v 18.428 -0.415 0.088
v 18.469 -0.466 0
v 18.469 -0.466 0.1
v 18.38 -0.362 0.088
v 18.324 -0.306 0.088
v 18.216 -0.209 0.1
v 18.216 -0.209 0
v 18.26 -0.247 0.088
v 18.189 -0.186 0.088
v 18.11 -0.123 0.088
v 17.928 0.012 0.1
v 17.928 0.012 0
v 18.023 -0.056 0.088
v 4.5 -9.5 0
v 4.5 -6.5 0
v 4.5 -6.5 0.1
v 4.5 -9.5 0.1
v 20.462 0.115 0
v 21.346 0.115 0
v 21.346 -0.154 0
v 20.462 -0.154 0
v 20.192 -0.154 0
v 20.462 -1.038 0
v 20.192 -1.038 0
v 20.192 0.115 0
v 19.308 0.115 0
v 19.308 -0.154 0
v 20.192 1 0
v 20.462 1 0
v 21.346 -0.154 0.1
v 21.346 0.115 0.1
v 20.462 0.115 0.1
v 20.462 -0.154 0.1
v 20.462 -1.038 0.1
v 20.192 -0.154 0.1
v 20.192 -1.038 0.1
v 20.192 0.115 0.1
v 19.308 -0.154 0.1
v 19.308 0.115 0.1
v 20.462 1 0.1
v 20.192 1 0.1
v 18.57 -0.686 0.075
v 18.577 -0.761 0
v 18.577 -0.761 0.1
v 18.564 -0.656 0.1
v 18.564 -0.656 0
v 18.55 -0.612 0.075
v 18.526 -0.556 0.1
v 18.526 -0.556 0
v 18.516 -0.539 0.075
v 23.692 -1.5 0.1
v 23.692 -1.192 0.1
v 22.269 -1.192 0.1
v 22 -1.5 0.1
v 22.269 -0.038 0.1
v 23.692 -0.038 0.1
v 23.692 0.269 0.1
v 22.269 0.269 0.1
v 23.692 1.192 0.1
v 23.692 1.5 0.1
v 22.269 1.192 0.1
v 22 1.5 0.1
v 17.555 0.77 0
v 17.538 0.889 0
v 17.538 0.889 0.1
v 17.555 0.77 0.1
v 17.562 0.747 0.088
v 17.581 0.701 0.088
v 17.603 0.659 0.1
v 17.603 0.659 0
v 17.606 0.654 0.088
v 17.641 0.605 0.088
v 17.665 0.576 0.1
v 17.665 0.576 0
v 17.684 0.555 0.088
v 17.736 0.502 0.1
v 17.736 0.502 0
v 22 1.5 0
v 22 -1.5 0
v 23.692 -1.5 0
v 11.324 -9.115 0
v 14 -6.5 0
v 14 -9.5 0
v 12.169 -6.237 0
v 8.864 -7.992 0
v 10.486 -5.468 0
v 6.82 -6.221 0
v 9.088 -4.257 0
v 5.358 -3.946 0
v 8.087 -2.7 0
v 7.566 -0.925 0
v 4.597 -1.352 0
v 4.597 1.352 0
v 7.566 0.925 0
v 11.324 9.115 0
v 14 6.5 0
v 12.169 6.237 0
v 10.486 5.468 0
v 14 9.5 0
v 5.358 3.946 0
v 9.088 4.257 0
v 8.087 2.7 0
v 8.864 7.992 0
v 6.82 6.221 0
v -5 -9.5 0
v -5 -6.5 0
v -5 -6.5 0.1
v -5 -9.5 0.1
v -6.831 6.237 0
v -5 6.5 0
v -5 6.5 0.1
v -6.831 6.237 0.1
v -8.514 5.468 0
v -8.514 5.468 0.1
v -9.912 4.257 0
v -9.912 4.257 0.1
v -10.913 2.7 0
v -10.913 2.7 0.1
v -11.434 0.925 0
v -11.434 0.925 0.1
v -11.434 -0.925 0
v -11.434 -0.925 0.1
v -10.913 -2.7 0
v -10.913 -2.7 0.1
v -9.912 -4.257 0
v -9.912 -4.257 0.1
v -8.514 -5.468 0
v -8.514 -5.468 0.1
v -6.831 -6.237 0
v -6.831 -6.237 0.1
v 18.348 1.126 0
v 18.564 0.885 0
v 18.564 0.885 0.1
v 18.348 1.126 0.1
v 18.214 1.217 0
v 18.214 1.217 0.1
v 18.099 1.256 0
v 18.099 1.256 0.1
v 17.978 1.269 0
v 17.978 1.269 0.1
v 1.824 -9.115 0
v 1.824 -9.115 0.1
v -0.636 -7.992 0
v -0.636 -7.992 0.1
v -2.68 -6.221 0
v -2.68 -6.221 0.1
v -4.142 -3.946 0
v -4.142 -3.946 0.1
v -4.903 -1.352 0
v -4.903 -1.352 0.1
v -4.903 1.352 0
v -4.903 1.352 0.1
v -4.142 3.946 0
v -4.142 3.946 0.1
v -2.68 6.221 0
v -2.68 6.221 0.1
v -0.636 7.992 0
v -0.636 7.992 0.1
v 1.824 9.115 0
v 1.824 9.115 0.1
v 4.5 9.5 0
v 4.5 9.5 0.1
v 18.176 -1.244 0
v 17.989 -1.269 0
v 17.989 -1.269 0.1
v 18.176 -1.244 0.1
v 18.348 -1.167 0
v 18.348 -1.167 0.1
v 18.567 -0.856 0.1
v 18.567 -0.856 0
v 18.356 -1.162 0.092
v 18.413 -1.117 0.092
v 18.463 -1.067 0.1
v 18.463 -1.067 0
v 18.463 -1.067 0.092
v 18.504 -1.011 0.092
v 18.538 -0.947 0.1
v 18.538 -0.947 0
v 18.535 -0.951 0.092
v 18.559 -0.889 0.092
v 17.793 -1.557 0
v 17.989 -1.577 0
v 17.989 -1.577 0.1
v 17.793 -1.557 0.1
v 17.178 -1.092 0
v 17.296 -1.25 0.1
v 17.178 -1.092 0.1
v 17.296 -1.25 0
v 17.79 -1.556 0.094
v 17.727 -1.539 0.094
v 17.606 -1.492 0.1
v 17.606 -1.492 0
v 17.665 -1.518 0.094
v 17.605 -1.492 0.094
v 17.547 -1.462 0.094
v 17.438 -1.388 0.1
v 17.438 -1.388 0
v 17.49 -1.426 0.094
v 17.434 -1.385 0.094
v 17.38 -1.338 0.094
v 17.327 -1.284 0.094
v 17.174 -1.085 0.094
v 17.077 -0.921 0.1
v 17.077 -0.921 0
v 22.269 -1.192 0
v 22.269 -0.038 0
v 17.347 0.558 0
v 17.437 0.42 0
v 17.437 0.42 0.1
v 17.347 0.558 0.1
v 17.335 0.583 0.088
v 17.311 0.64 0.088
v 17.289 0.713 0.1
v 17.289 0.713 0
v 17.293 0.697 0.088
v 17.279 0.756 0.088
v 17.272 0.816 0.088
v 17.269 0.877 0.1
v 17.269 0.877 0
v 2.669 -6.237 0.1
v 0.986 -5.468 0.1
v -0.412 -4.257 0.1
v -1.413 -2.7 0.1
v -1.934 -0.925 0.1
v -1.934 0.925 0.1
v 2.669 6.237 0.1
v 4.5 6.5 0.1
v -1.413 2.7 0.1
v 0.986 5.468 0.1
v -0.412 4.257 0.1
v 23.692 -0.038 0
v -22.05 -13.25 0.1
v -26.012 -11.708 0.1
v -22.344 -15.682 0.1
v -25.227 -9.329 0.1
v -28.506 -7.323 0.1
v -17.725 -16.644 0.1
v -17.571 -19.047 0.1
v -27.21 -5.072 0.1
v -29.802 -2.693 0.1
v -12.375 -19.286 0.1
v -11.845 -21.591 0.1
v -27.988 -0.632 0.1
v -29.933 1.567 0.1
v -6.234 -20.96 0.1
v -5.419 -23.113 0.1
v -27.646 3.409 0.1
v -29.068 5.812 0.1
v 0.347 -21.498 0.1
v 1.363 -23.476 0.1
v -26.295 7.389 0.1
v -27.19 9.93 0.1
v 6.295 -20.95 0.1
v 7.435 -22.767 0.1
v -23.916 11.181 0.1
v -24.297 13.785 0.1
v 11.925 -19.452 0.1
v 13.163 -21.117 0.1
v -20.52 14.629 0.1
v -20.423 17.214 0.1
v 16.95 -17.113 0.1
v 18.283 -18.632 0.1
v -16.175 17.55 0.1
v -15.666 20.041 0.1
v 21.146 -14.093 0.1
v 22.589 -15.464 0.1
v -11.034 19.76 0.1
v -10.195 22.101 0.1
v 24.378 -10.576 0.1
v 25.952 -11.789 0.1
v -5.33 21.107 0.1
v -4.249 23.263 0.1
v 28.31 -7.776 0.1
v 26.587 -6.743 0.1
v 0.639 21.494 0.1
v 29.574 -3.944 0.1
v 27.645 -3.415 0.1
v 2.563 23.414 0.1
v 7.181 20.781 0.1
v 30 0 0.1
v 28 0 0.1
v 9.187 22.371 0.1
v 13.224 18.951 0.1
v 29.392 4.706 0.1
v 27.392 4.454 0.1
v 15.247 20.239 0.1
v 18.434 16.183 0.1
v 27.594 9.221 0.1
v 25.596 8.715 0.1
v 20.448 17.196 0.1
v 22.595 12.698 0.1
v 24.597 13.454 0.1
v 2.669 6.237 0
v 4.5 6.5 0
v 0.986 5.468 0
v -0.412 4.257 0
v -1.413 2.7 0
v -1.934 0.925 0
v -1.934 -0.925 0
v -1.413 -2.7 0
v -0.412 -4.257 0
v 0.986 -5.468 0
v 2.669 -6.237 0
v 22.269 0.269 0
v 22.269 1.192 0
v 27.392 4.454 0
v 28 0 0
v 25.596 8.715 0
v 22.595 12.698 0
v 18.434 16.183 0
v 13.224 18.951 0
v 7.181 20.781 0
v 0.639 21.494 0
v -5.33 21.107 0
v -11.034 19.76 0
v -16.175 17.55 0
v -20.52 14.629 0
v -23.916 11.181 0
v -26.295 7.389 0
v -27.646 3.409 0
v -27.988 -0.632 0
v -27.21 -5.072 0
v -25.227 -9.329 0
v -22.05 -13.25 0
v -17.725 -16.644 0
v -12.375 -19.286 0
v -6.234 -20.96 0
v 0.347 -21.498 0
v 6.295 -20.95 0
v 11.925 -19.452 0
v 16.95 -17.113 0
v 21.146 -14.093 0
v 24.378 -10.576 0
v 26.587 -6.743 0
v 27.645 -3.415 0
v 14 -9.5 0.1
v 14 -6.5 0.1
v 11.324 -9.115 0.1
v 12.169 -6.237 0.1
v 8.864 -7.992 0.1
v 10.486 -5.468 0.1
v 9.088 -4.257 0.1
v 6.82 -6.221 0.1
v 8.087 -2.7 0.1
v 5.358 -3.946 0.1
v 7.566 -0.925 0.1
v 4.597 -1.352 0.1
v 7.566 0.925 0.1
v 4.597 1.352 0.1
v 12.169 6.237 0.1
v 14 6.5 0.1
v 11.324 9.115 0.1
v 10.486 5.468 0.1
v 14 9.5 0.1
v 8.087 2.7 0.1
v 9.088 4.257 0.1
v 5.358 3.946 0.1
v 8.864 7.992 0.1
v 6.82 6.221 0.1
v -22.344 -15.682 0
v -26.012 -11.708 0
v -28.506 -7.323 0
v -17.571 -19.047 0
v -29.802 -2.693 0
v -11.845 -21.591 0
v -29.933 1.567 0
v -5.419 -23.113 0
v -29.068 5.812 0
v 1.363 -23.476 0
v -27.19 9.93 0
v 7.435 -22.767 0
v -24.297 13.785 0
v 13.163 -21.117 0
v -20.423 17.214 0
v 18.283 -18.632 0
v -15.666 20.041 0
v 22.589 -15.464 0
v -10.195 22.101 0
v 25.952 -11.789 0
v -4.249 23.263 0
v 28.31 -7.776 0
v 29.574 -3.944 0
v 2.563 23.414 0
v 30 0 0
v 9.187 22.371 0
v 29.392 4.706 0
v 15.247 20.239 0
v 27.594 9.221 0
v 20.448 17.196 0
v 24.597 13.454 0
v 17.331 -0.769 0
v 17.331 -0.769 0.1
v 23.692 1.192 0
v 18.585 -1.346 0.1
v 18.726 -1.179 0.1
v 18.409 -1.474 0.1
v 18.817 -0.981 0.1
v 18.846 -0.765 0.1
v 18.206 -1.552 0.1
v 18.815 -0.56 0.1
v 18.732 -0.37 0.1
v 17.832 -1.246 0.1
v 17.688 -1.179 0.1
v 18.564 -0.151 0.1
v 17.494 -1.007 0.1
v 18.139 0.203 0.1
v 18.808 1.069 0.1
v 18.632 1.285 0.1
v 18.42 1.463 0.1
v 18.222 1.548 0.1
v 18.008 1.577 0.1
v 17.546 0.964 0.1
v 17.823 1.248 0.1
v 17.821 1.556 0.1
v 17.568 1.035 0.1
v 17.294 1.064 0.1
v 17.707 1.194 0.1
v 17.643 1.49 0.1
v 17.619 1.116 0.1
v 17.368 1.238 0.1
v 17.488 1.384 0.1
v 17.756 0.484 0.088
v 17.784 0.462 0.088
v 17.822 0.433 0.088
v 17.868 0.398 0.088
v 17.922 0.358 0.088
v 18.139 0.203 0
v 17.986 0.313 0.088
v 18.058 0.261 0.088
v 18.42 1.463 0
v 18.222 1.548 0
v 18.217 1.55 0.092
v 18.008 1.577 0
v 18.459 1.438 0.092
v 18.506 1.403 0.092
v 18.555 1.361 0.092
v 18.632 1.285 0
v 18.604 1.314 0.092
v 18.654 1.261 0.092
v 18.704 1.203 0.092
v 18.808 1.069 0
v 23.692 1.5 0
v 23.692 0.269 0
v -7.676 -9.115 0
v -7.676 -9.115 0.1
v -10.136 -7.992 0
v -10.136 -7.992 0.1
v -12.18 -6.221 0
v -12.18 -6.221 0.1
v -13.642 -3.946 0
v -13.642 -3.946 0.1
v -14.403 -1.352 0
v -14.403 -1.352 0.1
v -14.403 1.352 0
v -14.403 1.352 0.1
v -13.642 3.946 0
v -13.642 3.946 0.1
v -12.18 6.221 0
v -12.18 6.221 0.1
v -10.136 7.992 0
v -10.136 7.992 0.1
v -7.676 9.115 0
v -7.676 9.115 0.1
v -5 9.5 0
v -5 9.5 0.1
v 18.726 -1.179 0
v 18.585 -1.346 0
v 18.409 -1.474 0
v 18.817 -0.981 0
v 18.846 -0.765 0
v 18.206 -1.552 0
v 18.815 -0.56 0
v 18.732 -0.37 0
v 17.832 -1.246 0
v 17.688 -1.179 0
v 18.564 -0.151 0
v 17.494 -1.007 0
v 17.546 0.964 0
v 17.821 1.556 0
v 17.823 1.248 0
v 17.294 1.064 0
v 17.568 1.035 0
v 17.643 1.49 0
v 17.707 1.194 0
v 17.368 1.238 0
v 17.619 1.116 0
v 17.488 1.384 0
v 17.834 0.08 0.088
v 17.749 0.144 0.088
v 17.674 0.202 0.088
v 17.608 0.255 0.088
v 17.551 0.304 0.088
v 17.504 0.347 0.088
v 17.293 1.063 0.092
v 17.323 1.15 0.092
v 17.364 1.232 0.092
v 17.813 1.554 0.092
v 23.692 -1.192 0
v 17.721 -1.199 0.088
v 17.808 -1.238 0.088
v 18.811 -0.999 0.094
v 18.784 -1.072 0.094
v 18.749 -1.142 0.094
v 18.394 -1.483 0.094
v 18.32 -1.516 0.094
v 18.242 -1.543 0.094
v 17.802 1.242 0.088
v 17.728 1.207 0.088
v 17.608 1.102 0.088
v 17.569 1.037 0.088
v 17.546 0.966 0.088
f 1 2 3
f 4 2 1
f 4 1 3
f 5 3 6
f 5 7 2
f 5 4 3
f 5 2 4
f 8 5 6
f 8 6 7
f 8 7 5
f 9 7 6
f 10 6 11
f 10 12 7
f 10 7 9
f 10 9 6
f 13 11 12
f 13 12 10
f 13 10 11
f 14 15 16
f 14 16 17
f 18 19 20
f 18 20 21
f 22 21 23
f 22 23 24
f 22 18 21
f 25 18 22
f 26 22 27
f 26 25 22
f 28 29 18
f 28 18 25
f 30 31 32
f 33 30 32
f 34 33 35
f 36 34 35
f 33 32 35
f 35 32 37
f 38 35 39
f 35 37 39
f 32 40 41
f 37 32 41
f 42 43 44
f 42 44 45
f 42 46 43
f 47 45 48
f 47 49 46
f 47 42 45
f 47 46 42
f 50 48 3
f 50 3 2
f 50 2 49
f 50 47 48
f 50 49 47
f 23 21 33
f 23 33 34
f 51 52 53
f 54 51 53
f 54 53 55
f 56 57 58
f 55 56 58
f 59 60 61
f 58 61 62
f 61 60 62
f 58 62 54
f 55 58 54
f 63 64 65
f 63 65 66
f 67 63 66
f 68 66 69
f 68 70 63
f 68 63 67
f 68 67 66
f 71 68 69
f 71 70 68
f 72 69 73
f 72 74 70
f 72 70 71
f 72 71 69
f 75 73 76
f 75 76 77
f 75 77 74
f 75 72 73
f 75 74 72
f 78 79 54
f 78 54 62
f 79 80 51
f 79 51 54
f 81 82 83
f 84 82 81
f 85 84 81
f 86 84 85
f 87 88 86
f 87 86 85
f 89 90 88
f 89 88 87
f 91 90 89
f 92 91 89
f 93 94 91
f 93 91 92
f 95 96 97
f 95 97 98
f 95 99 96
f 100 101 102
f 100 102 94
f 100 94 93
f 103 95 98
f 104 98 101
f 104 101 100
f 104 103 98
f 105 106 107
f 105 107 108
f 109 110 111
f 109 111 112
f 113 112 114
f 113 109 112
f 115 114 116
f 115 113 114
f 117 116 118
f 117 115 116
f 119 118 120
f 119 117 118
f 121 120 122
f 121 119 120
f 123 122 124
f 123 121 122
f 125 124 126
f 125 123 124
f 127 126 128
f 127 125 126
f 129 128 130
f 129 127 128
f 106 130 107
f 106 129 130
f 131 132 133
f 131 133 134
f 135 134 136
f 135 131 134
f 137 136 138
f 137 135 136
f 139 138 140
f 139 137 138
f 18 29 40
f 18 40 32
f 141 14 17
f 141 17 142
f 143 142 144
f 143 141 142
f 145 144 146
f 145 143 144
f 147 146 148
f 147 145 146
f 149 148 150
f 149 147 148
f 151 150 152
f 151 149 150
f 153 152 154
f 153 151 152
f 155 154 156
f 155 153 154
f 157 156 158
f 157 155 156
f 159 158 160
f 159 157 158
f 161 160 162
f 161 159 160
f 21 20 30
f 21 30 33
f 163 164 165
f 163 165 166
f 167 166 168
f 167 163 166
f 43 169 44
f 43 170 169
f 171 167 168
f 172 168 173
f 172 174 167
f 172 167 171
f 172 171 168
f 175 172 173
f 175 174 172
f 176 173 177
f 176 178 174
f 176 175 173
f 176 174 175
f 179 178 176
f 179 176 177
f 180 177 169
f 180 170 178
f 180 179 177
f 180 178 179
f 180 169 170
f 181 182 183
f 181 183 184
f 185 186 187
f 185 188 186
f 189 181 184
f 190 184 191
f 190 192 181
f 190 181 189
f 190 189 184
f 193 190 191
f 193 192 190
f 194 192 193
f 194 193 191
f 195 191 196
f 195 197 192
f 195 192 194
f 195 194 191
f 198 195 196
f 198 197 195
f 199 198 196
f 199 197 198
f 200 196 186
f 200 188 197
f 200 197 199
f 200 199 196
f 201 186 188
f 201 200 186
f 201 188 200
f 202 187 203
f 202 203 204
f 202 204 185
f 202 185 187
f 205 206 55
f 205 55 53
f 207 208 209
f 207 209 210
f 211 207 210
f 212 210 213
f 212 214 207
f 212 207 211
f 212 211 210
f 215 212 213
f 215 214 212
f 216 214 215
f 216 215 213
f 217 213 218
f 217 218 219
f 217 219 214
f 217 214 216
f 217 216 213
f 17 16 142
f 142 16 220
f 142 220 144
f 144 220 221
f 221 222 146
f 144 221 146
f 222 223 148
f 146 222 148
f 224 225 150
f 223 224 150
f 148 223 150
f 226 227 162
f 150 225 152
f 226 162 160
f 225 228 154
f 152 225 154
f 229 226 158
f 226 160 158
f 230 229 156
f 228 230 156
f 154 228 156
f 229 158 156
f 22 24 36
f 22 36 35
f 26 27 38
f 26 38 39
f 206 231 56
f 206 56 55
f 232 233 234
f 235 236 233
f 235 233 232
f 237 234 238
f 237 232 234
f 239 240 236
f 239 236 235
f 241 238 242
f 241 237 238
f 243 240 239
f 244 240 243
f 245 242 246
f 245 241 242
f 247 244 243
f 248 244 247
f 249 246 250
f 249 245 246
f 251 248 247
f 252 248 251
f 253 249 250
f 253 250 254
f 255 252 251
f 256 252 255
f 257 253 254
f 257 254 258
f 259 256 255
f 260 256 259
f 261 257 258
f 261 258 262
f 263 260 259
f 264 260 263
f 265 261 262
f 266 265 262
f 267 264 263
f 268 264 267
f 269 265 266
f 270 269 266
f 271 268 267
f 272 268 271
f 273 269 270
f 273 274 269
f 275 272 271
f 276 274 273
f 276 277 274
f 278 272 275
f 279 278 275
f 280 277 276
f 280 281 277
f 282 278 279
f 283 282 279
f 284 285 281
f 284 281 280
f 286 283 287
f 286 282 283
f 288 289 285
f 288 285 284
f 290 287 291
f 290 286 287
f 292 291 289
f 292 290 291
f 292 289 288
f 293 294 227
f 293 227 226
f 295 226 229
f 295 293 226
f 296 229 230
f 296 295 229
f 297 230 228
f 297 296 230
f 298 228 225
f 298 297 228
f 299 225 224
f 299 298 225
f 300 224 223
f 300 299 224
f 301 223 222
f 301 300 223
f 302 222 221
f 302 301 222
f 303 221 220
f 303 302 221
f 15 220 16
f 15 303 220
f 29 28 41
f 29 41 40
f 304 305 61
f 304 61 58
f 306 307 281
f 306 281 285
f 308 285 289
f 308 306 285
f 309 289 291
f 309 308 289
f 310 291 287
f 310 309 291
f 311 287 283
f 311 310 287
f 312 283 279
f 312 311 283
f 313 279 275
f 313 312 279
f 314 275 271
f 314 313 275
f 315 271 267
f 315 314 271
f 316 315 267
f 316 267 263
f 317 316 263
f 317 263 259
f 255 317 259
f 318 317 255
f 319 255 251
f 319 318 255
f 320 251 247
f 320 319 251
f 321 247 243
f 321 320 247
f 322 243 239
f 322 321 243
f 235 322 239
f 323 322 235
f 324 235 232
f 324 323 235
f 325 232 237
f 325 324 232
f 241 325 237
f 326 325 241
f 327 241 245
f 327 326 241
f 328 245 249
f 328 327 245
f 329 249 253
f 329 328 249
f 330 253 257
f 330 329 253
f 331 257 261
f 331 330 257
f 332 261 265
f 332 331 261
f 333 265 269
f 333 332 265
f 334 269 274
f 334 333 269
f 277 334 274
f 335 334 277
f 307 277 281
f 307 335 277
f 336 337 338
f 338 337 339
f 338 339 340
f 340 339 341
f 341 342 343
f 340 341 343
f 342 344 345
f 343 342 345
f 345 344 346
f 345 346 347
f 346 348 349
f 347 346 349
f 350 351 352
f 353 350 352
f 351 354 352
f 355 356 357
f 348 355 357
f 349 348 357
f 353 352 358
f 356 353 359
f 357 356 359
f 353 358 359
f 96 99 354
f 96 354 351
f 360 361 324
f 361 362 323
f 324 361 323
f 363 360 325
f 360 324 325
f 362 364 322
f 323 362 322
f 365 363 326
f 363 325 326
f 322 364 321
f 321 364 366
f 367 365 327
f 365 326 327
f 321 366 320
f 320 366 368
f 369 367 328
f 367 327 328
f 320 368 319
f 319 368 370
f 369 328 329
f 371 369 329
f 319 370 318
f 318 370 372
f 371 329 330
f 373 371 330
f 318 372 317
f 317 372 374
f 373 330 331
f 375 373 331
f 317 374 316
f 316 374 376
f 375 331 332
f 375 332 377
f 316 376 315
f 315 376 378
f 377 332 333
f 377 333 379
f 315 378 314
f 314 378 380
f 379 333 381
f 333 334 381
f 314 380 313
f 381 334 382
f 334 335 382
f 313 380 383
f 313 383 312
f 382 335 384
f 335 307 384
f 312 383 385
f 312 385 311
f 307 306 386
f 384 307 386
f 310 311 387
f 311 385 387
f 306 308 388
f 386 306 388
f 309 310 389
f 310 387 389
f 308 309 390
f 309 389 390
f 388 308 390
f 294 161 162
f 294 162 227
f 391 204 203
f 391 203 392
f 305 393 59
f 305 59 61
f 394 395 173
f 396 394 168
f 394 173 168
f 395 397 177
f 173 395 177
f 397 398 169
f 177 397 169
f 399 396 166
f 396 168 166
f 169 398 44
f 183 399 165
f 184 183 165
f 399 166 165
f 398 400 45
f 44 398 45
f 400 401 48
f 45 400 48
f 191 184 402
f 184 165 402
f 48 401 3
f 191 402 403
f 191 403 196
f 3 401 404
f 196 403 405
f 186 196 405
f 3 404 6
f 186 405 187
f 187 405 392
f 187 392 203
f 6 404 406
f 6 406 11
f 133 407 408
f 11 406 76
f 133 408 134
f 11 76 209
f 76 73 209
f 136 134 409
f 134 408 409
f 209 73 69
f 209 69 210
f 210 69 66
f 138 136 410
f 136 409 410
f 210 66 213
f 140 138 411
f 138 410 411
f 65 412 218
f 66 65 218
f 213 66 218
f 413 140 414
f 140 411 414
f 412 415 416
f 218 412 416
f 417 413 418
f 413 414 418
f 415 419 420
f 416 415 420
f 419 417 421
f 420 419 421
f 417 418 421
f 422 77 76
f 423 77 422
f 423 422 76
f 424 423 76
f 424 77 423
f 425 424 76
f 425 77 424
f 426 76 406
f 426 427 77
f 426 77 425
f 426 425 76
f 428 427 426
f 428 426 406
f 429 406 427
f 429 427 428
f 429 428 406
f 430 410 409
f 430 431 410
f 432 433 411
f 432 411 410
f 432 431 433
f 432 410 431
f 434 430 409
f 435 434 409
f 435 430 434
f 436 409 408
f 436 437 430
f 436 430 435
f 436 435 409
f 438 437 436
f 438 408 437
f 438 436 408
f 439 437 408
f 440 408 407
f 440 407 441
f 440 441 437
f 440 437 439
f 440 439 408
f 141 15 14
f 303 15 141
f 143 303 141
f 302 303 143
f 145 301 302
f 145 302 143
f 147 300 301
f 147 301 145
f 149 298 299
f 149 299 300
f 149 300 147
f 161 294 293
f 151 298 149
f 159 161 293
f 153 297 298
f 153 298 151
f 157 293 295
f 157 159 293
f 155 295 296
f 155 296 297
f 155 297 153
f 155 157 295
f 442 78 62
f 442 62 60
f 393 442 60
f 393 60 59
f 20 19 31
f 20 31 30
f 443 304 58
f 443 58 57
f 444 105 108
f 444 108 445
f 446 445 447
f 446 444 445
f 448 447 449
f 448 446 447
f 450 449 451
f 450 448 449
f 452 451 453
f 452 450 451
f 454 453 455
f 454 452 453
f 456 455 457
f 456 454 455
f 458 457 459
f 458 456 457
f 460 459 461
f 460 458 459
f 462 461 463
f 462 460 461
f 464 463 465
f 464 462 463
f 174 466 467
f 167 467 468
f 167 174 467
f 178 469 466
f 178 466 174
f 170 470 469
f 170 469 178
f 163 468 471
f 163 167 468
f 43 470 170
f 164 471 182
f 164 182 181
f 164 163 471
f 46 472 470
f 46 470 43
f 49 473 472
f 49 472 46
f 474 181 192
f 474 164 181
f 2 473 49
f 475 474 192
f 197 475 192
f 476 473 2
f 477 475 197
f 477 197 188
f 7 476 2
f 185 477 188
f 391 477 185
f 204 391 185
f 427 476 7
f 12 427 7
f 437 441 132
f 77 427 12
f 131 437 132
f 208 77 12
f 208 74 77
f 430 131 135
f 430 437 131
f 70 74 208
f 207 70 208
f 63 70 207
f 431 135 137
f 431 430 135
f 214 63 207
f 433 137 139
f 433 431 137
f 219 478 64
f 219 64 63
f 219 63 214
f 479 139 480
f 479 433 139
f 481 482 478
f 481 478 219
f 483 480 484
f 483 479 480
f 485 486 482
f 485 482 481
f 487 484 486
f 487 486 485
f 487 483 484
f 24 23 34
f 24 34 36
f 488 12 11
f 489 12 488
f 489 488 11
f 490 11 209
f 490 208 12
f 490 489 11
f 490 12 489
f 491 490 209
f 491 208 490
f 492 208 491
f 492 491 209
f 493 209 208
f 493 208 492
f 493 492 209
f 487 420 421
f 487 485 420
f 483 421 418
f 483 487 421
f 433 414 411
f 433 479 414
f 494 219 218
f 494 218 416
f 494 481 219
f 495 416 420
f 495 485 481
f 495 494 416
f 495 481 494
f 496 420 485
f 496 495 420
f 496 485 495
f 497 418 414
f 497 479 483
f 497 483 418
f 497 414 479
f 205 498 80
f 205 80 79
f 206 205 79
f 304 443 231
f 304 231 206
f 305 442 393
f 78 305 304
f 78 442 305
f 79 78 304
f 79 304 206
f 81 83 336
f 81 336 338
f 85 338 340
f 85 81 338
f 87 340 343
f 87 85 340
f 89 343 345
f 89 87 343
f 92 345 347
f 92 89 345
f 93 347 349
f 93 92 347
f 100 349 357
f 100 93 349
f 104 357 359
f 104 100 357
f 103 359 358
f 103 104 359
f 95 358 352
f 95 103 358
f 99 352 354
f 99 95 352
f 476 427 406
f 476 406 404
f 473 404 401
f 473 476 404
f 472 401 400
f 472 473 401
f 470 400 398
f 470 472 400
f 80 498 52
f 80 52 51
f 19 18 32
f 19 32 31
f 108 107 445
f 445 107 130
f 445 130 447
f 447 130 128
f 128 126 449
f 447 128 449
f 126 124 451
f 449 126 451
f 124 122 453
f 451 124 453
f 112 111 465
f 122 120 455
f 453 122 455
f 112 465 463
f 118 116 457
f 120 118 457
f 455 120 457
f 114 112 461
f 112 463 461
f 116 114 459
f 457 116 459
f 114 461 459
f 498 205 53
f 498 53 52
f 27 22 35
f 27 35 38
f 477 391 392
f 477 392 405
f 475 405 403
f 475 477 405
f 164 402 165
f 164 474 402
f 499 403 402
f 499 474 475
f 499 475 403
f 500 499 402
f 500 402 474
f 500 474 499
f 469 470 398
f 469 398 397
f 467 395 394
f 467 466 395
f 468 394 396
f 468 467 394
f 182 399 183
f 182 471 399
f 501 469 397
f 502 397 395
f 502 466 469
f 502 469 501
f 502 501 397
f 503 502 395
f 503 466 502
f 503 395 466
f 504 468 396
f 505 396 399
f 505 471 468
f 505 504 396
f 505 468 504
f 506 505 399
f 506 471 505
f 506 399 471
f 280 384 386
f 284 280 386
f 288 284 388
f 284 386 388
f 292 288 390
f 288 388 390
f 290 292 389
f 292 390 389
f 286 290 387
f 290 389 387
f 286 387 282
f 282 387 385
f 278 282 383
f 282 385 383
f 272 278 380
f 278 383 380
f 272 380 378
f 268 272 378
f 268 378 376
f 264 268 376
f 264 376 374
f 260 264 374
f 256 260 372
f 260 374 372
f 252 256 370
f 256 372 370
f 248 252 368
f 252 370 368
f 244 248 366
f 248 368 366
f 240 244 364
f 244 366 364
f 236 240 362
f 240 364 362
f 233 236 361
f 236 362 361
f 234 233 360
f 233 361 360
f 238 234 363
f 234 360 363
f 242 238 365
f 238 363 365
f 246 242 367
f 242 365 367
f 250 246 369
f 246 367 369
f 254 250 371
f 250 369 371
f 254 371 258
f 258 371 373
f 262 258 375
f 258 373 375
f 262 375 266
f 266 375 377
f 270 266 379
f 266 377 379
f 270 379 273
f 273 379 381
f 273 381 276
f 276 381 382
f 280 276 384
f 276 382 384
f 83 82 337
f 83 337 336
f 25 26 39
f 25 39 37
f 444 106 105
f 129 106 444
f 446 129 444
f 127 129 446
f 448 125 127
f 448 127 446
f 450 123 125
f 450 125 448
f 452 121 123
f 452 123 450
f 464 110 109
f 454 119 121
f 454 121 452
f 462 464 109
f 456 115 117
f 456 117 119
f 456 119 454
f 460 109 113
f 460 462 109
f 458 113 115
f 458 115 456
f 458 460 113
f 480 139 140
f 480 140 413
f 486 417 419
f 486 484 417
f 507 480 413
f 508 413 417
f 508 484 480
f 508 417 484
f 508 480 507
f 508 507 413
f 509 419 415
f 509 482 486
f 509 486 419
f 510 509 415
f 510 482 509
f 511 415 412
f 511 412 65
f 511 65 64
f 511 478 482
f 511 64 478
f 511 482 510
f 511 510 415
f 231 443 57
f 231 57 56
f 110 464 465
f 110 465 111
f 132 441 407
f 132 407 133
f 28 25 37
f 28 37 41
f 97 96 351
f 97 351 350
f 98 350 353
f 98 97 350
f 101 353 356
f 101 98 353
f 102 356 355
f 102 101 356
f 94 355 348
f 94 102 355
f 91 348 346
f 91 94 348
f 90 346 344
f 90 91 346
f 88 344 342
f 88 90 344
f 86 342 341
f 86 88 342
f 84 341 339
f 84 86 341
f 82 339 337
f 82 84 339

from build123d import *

# Parameters (mm, degrees)
SKIZZE1_RX                        = 30
SKIZZE1_RY                        = 23.5
SKIZZE1_RX_2                      = 28
SKIZZE1_RY_2                      = 21.5
AUFSATZ_LINEAR_AUSTRAGEN1_DEPTH   = 0.1
AUFSATZ_LINEAR_AUSTRAGEN1_2_DEPTH = 0.1
AUFSATZ_LINEAR_AUSTRAGEN1_3_DEPTH = 0.1
AUFSATZ_LINEAR_AUSTRAGEN1_4_DEPTH = 0.1
AUFSATZ_LINEAR_AUSTRAGEN2_DEPTH   = 0.1
AUFSATZ_LINEAR_AUSTRAGEN2_2_DEPTH = 0.1
AUFSATZ_LINEAR_AUSTRAGEN2_3_DEPTH = 0.1


with BuildPart() as part:
    # Skizze1 → Aufsatz-Linear austragen1 (new body)
    with BuildSketch(Plane.XY):
        with Locations((0, 0)):
            Ellipse(SKIZZE1_RX, SKIZZE1_RY)
        with Locations((0, 0)):
            Ellipse(SKIZZE1_RX_2, SKIZZE1_RY_2, mode=Mode.SUBTRACT)
    extrude(amount=AUFSATZ_LINEAR_AUSTRAGEN1_DEPTH)


with BuildPart() as body_2:
    # Skizze1 → Aufsatz-Linear austragen1 2 (new body)
    with BuildSketch(Plane.XY):
        with BuildLine():
            ThreePointArc((-5, 6.5), (-11.5, 0), (-5, -6.5))
            Line((-5, -6.5), (-5, -9.5))
            ThreePointArc((-5, -9.5), (-14.5, 0), (-5, 9.5))
            Line((-5, 9.5), (-5, 6.5))
        make_face()
    extrude(amount=AUFSATZ_LINEAR_AUSTRAGEN1_2_DEPTH)


with BuildPart() as body_3:
    # Skizze1 → Aufsatz-Linear austragen1 3 (new body)
    with BuildSketch(Plane.XY):
        with BuildLine():
            ThreePointArc((4.5, 6.5), (-2, 0), (4.5, -6.5))
            Line((4.5, -6.5), (4.5, -9.5))
            ThreePointArc((4.5, -9.5), (-5, 0), (4.5, 9.5))
            Line((4.5, 9.5), (4.5, 6.5))
        make_face()
    extrude(amount=AUFSATZ_LINEAR_AUSTRAGEN1_3_DEPTH)


with BuildPart() as body_4:
    # Skizze1 → Aufsatz-Linear austragen1 4 (new body)
    with BuildSketch(Plane.XY):
        with BuildLine():
            ThreePointArc((14, 6.5), (7.5, 0), (14, -6.5))
            Line((14, -6.5), (14, -9.5))
            ThreePointArc((14, -9.5), (4.5, 0), (14, 9.5))
            Line((14, 9.5), (14, 6.5))
        make_face()
    extrude(amount=AUFSATZ_LINEAR_AUSTRAGEN1_4_DEPTH)


with BuildPart() as body_5:
    # Skizze4 → Aufsatz-Linear austragen2 (new body)
    with BuildSketch(Plane.XY):
        with BuildLine():
            Line((17.076923077, -0.921274038), (17.330528846, -0.769230769))
            add(Edge.make_bspline(
                [(17.330528846, -0.769230769), (17.354115907, -0.808714528), (17.399307804, -0.884363885), (17.474694684, -0.986585063), (17.552808607, -1.073466912), (17.634228036, -1.144504004), (17.718455992, -1.200431621), (17.806042324, -1.240033534), (17.896691876, -1.264732941), (17.958383723, -1.267733015), (17.989182692, -1.269230769)],
                knots=[0, 0, 0, 0, 1.272034388, 2.437168799, 3.508375237, 4.49857839, 5.41946034, 6.295179144, 7.148887113, 8, 8, 8, 8], degree=3))
            add(Edge.make_bspline(
                [(17.989182692, -1.269230769), (18.015485716, -1.268498193), (18.067631521, -1.267045858), (18.144399158, -1.253090885), (18.218954988, -1.231651917), (18.289762392, -1.200948262), (18.355844347, -1.163800988), (18.413792943, -1.118932836), (18.463889612, -1.068698946), (18.504868853, -1.01265667), (18.536308883, -0.952384829), (18.560473513, -0.890519727), (18.573883576, -0.826089526), (18.575903651, -0.782709129), (18.576923077, -0.760817308)],
                knots=[0, 0, 0, 0, 1.095163259, 2.171163733, 3.241058638, 4.321873601, 5.38011039, 6.391990106, 7.366004449, 8.327778327, 9.272591725, 10.192022065, 11.087607919, 12, 12, 12, 12], degree=3))
            add(Edge.make_bspline(
                [(18.576923077, -0.760817308), (18.575659382, -0.735839437), (18.573090475, -0.685063074), (18.551377778, -0.610149086), (18.51722128, -0.536012598), (18.485710443, -0.49015437), (18.469350962, -0.466346154)],
                knots=[0, 0, 0, 0, 0.938893495, 1.908633276, 2.914225137, 4, 4, 4, 4], degree=3))
            add(Edge.make_bspline(
                [(18.469350962, -0.466346154), (18.455919007, -0.449163162), (18.427720297, -0.413089621), (18.379242429, -0.359393704), (18.322357188, -0.304006488), (18.259011284, -0.244813011), (18.186897208, -0.184566328), (18.108273624, -0.120393518), (18.021133174, -0.054735024), (17.960019319, -0.010701396), (17.928485577, 0.012019231)],
                knots=[0, 0, 0, 0, 0.722233717, 1.516239348, 2.393582979, 3.351407094, 4.387010283, 5.505090956, 6.712668013, 8, 8, 8, 8], degree=3))
            add(Edge.make_bspline(
                [(17.928485577, 0.012019231), (17.896922152, 0.034500877), (17.836575286, 0.077484074), (17.752182215, 0.141276317), (17.676715533, 0.199599634), (17.610510662, 0.253003073), (17.553596721, 0.301493877), (17.505525226, 0.344606396), (17.467520749, 0.383506591), (17.446387394, 0.408742027), (17.436899038, 0.420072115)],
                knots=[0, 0, 0, 0, 1.452282411, 2.77665338, 3.964542531, 5.026858415, 5.96415736, 6.766646006, 7.446254459, 8, 8, 8, 8], degree=3))
            add(Edge.make_bspline(
                [(17.436899038, 0.420072115), (17.423636857, 0.437730147), (17.397554997, 0.472457036), (17.363126992, 0.526735485), (17.333864853, 0.582298284), (17.310925711, 0.63929474), (17.291608952, 0.696924679), (17.27861644, 0.755940032), (17.270480957, 0.816075991), (17.269647825, 0.856544706), (17.269230769, 0.876802885)],
                knots=[0, 0, 0, 0, 1.068054152, 2.10047183, 3.106115577, 4.101338837, 5.06977816, 6.043150881, 7.020423561, 8, 8, 8, 8], degree=3))
            add(Edge.make_bspline(
                [(17.269230769, 0.876802885), (17.27034952, 0.908542691), (17.272563108, 0.971343889), (17.291283552, 1.063084601), (17.320831746, 1.150672958), (17.362227365, 1.233241816), (17.41559081, 1.308641228), (17.477344502, 1.377738503), (17.550897205, 1.435825859), (17.631599453, 1.486579052), (17.719933486, 1.52630413), (17.812497118, 1.556270685), (17.909437465, 1.573250049), (17.975097295, 1.575686704), (18.008413462, 1.576923077)],
                knots=[0, 0, 0, 0, 1.005424448, 1.989358655, 2.955360095, 3.929531133, 4.905563448, 5.876582895, 6.856512386, 7.866279853, 8.892233794, 9.918561126, 10.94386622, 12, 12, 12, 12], degree=3))
            add(Edge.make_bspline(
                [(18.008413462, 1.576923077), (18.043765548, 1.575703747), (18.114069563, 1.573278889), (18.217483177, 1.552195291), (18.317049505, 1.517309001), (18.397143732, 1.477718722), (18.459828956, 1.438177509), (18.507634156, 1.402160517), (18.556077685, 1.360696138), (18.605550303, 1.313673927), (18.655213726, 1.260662426), (18.705805256, 1.202024693), (18.757443201, 1.138119073), (18.790662509, 1.092498073), (18.807692308, 1.069110577)],
                knots=[0, 0, 0, 0, 1.286793592, 2.559021753, 3.825965368, 5.121522368, 5.803751409, 6.523245864, 7.299691795, 8.125521123, 9.008227632, 9.944561021, 10.946284179, 12, 12, 12, 12], degree=3))
            Line((18.807692308, 1.069110577), (18.564302885, 0.884615385))
            add(Edge.make_bspline(
                [(18.564302885, 0.884615385), (18.549606371, 0.903548548), (18.521304322, 0.940009393), (18.478336191, 0.991070521), (18.437837349, 1.037713218), (18.397937007, 1.078226185), (18.360742466, 1.114828013), (18.324642144, 1.146164948), (18.290155557, 1.17254403), (18.246683919, 1.200695652), (18.192068732, 1.228601227), (18.123510558, 1.252214722), (18.051865179, 1.266404775), (18.003068353, 1.268280965), (17.978365385, 1.269230769)],
                knots=[0, 0, 0, 0, 1.181633172, 2.275549214, 3.290209073, 4.226197932, 5.078386478, 5.862611352, 6.581680152, 7.217281963, 8.414376989, 9.595101626, 10.782541182, 12, 12, 12, 12], degree=3))
            add(Edge.make_bspline(
                [(17.978365385, 1.269230769), (17.94737408, 1.268192169), (17.887610268, 1.266189327), (17.802761494, 1.244315054), (17.726395272, 1.209873459), (17.660778788, 1.161603478), (17.606147093, 1.104414056), (17.566628129, 1.038603609), (17.542842273, 0.965932978), (17.539939748, 0.91524013), (17.538461538, 0.889423077)],
                knots=[0, 0, 0, 0, 1.14458467, 2.207223713, 3.21896685, 4.227309161, 5.202851033, 6.127160689, 7.046193047, 8, 8, 8, 8], degree=3))
            add(Edge.make_bspline(
                [(17.538461538, 0.889423077), (17.538798504, 0.873350381), (17.539472987, 0.841178707), (17.548879956, 0.793648917), (17.560965095, 0.746239197), (17.580115922, 0.699162698), (17.606554754, 0.651596104), (17.641273476, 0.602720329), (17.684999172, 0.552104579), (17.718493754, 0.519183973), (17.736177885, 0.501802885)],
                knots=[0, 0, 0, 0, 0.858281714, 1.717966888, 2.583508476, 3.4729293, 4.427298488, 5.488583878, 6.674047936, 8, 8, 8, 8], degree=3))
            add(Edge.make_bspline(
                [(17.736177885, 0.501802885), (17.742744775, 0.495942577), (17.758346204, 0.482019827), (17.786868426, 0.459226443), (17.824533682, 0.431109781), (17.870358426, 0.396320653), (17.925187593, 0.355965114), (17.989027213, 0.310559161), (18.061165669, 0.258628767), (18.112355883, 0.222322304), (18.139423077, 0.203125)],
                knots=[0, 0, 0, 0, 0.420754252, 0.999615792, 1.744751191, 2.668019286, 3.750313428, 4.999500688, 6.413464383, 8, 8, 8, 8], degree=3))
            add(Edge.make_bspline(
                [(18.139423077, 0.203125), (18.171982431, 0.179432406), (18.235029108, 0.133554982), (18.324735605, 0.064627256), (18.406073155, -0.002785117), (18.479327329, -0.068251637), (18.545221822, -0.131275717), (18.603025583, -0.192615586), (18.653327595, -0.251831791), (18.707481211, -0.327751142), (18.762816484, -0.420992071), (18.810337776, -0.535230561), (18.840302074, -0.649913122), (18.844220516, -0.726993267), (18.846153846, -0.765024038)],
                knots=[0, 0, 0, 0, 1.163667725, 2.253281268, 3.268753668, 4.215851969, 5.092017293, 5.902905408, 6.650798638, 7.335211899, 8.59617414, 9.77448103, 10.901945474, 12, 12, 12, 12], degree=3))
            add(Edge.make_bspline(
                [(18.846153846, -0.765024038), (18.845590585, -0.79191978), (18.844475001, -0.845188966), (18.83165136, -0.923407603), (18.812863076, -0.99937692), (18.784545447, -1.072157874), (18.74998274, -1.143081956), (18.706125956, -1.210288728), (18.655290797, -1.275265641), (18.596976142, -1.336280062), (18.533165368, -1.392291087), (18.465722201, -1.442115997), (18.394536253, -1.483660274), (18.319993696, -1.517560996), (18.242077407, -1.544075439), (18.160813593, -1.56328647), (18.076068297, -1.575077079), (18.018467885, -1.576300875), (17.989182692, -1.576923077)],
                knots=[0, 0, 0, 0, 0.983748083, 1.948392443, 2.894712957, 3.844097841, 4.80183111, 5.778335162, 6.776009319, 7.81870978, 8.863265674, 9.881300176, 10.883814829, 11.87499822, 12.874611388, 13.892143829, 14.928324115, 16, 16, 16, 16], degree=3))
            add(Edge.make_bspline(
                [(17.989182692, -1.576923077), (17.966523827, -1.576484921), (17.921491461, -1.575614128), (17.854883334, -1.567915888), (17.789620829, -1.557024085), (17.726522873, -1.539732025), (17.66477652, -1.518751759), (17.604650319, -1.492918902), (17.54611513, -1.461961301), (17.488842916, -1.426565565), (17.432979338, -1.385373213), (17.379048365, -1.33739593), (17.325280492, -1.283956926), (17.273262724, -1.223605015), (17.221942886, -1.157315229), (17.17233282, -1.084467358), (17.123405634, -1.005458197), (17.092706661, -0.949859553), (17.076923077, -0.921274038)],
                knots=[0, 0, 0, 0, 0.915332311, 1.819136955, 2.706846663, 3.586547465, 4.459518054, 5.340707479, 6.227863349, 7.133153174, 8.059268498, 9.028702269, 10.047606654, 11.120612155, 12.245963614, 13.433783089, 14.680604001, 16, 16, 16, 16], degree=3))
        make_face()
    extrude(amount=AUFSATZ_LINEAR_AUSTRAGEN2_DEPTH)


with BuildPart() as body_6:
    # Skizze4 → Aufsatz-Linear austragen2 2 (new body)
    with BuildSketch(Plane.XY):
        Polygon((20.192307692, 0.115384615), (20.192307692, 1), (20.461538462, 1), (20.461538462, 0.115384615), (21.346153846, 0.115384615), (21.346153846, -0.153846154), (20.461538462, -0.153846154), (20.461538462, -1.038461538), (20.192307692, -1.038461538), (20.192307692, -0.153846154), (19.307692308, -0.153846154), (19.307692308, 0.115384615), align=None)
    extrude(amount=AUFSATZ_LINEAR_AUSTRAGEN2_2_DEPTH)


with BuildPart() as body_7:
    # Skizze4 → Aufsatz-Linear austragen2 3 (new body)
    with BuildSketch(Plane.XY):
        Polygon((22, 1.5), (23.692307692, 1.5), (23.692307692, 1.192307692), (22.269230769, 1.192307692), (22.269230769, 0.269230769), (23.692307692, 0.269230769), (23.692307692, -0.038461538), (22.269230769, -0.038461538), (22.269230769, -1.192307692), (23.692307692, -1.192307692), (23.692307692, -1.5), (22, -1.5), align=None)
    extrude(amount=AUFSATZ_LINEAR_AUSTRAGEN2_3_DEPTH)


solid = Compound([part.part, body_2.part, body_3.part, body_4.part, body_5.part, body_6.part, body_7.part])
